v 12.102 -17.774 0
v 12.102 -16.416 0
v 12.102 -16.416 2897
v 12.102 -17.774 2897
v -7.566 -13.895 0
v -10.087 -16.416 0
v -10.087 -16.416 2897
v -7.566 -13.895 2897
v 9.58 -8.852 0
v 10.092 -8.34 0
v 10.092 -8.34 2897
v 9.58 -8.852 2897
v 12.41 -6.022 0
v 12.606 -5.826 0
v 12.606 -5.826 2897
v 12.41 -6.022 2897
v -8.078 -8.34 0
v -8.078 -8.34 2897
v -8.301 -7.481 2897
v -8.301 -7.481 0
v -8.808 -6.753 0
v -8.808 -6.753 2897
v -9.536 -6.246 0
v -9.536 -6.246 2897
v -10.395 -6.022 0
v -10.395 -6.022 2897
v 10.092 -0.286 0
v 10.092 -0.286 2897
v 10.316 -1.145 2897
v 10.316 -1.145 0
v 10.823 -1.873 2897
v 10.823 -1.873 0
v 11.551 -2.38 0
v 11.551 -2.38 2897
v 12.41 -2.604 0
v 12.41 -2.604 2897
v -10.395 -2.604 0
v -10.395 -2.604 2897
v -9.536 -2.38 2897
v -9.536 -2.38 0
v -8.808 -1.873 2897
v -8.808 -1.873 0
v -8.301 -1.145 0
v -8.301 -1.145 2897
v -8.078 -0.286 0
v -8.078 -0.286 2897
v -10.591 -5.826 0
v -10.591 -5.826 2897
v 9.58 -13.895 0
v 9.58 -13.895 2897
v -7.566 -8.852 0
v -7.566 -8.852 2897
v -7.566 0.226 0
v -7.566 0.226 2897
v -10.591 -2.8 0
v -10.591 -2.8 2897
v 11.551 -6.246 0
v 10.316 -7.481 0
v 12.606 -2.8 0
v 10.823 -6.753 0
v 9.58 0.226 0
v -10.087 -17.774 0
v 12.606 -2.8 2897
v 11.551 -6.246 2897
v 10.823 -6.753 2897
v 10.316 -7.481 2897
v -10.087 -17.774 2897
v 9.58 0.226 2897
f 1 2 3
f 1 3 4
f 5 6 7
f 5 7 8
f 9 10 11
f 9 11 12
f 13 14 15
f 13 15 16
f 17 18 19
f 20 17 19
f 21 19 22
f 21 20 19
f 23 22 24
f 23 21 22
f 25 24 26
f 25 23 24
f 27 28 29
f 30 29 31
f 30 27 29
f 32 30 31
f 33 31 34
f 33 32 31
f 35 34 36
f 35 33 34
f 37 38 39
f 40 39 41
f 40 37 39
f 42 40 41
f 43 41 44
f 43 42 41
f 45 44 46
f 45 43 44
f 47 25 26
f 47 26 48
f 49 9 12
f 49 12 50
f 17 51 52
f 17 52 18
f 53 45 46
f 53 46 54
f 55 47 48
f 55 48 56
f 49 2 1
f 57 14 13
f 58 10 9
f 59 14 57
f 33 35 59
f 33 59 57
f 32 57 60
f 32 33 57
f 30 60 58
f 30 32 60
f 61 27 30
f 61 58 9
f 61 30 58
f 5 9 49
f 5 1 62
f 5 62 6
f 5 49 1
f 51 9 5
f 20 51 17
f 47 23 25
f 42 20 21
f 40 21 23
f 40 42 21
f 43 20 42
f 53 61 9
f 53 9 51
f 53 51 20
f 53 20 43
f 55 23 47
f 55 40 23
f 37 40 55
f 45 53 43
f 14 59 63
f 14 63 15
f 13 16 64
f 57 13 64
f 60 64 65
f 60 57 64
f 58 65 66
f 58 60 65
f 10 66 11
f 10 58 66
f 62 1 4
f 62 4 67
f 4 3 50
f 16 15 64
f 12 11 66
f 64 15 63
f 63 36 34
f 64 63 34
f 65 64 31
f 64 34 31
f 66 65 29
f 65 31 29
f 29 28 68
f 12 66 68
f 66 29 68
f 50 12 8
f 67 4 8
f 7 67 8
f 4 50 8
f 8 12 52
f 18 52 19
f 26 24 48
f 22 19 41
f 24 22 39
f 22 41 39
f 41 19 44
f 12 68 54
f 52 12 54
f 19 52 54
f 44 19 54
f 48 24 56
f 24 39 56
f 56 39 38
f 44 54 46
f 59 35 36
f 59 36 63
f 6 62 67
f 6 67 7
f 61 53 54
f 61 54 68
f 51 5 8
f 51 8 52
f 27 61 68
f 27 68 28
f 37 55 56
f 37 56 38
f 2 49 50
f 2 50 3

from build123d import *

# Parameters (mm, degrees)
ESTRUSIONE_ESTRUSIONE1_DEPTH = 2897


with BuildPart() as part:
    # Schizzo1 → Estrusione-Estrusione1 (new body)
    with BuildSketch(Plane.XY):
        with BuildLine():
            Line((-10.087089482, -16.415981983), (-7.565622613, -13.894515114))
            Line((-7.565622613, -13.894515114), (-7.565622613, -8.851581376))
            Line((-7.565622613, -8.851581376), (-8.0775657, -8.339638289))
            ThreePointArc((-8.0775657, -8.339638289), (-8.808436534, -6.752953221), (-10.395121602, -6.022082387))
            Line((-10.395121602, -6.022082387), (-10.591382856, -5.825821133))
            Line((-10.591382856, -5.825821133), (-10.591382856, -2.800060891))
            Line((-10.591382856, -2.800060891), (-10.395121602, -2.603799637))
            ThreePointArc((-10.395121602, -2.603799637), (-8.808436534, -1.872928803), (-8.0775657, -0.286243735))
            Line((-8.0775657, -0.286243735), (-7.565622613, 0.225699352))
            Line((-7.565622613, 0.225699352), (9.580352097, 0.225699352))
            Line((9.580352097, 0.225699352), (10.092295184, -0.286243735))
            ThreePointArc((10.092295184, -0.286243735), (10.823166018, -1.872928803), (12.409851086, -2.603799637))
            Line((12.409851086, -2.603799637), (12.606112339, -2.800060891))
            Line((12.606112339, -2.800060891), (12.606112339, -5.825821133))
            Line((12.606112339, -5.825821133), (12.409851086, -6.022082387))
            ThreePointArc((12.409851086, -6.022082387), (10.823166018, -6.752953221), (10.092295184, -8.339638289))
            Line((10.092295184, -8.339638289), (9.580352097, -8.851581376))
            Line((9.580352097, -8.851581376), (9.580352097, -13.894515114))
            Line((9.580352097, -13.894515114), (12.101818966, -16.415981983))
            Line((12.101818966, -16.415981983), (12.101818966, -17.774300648))
            Line((12.101818966, -17.774300648), (-10.087089482, -17.774300648))
            Line((-10.087089482, -17.774300648), (-10.087089482, -16.415981983))
        make_face()
    extrude(amount=ESTRUSIONE_ESTRUSIONE1_DEPTH)


solid = part.part
